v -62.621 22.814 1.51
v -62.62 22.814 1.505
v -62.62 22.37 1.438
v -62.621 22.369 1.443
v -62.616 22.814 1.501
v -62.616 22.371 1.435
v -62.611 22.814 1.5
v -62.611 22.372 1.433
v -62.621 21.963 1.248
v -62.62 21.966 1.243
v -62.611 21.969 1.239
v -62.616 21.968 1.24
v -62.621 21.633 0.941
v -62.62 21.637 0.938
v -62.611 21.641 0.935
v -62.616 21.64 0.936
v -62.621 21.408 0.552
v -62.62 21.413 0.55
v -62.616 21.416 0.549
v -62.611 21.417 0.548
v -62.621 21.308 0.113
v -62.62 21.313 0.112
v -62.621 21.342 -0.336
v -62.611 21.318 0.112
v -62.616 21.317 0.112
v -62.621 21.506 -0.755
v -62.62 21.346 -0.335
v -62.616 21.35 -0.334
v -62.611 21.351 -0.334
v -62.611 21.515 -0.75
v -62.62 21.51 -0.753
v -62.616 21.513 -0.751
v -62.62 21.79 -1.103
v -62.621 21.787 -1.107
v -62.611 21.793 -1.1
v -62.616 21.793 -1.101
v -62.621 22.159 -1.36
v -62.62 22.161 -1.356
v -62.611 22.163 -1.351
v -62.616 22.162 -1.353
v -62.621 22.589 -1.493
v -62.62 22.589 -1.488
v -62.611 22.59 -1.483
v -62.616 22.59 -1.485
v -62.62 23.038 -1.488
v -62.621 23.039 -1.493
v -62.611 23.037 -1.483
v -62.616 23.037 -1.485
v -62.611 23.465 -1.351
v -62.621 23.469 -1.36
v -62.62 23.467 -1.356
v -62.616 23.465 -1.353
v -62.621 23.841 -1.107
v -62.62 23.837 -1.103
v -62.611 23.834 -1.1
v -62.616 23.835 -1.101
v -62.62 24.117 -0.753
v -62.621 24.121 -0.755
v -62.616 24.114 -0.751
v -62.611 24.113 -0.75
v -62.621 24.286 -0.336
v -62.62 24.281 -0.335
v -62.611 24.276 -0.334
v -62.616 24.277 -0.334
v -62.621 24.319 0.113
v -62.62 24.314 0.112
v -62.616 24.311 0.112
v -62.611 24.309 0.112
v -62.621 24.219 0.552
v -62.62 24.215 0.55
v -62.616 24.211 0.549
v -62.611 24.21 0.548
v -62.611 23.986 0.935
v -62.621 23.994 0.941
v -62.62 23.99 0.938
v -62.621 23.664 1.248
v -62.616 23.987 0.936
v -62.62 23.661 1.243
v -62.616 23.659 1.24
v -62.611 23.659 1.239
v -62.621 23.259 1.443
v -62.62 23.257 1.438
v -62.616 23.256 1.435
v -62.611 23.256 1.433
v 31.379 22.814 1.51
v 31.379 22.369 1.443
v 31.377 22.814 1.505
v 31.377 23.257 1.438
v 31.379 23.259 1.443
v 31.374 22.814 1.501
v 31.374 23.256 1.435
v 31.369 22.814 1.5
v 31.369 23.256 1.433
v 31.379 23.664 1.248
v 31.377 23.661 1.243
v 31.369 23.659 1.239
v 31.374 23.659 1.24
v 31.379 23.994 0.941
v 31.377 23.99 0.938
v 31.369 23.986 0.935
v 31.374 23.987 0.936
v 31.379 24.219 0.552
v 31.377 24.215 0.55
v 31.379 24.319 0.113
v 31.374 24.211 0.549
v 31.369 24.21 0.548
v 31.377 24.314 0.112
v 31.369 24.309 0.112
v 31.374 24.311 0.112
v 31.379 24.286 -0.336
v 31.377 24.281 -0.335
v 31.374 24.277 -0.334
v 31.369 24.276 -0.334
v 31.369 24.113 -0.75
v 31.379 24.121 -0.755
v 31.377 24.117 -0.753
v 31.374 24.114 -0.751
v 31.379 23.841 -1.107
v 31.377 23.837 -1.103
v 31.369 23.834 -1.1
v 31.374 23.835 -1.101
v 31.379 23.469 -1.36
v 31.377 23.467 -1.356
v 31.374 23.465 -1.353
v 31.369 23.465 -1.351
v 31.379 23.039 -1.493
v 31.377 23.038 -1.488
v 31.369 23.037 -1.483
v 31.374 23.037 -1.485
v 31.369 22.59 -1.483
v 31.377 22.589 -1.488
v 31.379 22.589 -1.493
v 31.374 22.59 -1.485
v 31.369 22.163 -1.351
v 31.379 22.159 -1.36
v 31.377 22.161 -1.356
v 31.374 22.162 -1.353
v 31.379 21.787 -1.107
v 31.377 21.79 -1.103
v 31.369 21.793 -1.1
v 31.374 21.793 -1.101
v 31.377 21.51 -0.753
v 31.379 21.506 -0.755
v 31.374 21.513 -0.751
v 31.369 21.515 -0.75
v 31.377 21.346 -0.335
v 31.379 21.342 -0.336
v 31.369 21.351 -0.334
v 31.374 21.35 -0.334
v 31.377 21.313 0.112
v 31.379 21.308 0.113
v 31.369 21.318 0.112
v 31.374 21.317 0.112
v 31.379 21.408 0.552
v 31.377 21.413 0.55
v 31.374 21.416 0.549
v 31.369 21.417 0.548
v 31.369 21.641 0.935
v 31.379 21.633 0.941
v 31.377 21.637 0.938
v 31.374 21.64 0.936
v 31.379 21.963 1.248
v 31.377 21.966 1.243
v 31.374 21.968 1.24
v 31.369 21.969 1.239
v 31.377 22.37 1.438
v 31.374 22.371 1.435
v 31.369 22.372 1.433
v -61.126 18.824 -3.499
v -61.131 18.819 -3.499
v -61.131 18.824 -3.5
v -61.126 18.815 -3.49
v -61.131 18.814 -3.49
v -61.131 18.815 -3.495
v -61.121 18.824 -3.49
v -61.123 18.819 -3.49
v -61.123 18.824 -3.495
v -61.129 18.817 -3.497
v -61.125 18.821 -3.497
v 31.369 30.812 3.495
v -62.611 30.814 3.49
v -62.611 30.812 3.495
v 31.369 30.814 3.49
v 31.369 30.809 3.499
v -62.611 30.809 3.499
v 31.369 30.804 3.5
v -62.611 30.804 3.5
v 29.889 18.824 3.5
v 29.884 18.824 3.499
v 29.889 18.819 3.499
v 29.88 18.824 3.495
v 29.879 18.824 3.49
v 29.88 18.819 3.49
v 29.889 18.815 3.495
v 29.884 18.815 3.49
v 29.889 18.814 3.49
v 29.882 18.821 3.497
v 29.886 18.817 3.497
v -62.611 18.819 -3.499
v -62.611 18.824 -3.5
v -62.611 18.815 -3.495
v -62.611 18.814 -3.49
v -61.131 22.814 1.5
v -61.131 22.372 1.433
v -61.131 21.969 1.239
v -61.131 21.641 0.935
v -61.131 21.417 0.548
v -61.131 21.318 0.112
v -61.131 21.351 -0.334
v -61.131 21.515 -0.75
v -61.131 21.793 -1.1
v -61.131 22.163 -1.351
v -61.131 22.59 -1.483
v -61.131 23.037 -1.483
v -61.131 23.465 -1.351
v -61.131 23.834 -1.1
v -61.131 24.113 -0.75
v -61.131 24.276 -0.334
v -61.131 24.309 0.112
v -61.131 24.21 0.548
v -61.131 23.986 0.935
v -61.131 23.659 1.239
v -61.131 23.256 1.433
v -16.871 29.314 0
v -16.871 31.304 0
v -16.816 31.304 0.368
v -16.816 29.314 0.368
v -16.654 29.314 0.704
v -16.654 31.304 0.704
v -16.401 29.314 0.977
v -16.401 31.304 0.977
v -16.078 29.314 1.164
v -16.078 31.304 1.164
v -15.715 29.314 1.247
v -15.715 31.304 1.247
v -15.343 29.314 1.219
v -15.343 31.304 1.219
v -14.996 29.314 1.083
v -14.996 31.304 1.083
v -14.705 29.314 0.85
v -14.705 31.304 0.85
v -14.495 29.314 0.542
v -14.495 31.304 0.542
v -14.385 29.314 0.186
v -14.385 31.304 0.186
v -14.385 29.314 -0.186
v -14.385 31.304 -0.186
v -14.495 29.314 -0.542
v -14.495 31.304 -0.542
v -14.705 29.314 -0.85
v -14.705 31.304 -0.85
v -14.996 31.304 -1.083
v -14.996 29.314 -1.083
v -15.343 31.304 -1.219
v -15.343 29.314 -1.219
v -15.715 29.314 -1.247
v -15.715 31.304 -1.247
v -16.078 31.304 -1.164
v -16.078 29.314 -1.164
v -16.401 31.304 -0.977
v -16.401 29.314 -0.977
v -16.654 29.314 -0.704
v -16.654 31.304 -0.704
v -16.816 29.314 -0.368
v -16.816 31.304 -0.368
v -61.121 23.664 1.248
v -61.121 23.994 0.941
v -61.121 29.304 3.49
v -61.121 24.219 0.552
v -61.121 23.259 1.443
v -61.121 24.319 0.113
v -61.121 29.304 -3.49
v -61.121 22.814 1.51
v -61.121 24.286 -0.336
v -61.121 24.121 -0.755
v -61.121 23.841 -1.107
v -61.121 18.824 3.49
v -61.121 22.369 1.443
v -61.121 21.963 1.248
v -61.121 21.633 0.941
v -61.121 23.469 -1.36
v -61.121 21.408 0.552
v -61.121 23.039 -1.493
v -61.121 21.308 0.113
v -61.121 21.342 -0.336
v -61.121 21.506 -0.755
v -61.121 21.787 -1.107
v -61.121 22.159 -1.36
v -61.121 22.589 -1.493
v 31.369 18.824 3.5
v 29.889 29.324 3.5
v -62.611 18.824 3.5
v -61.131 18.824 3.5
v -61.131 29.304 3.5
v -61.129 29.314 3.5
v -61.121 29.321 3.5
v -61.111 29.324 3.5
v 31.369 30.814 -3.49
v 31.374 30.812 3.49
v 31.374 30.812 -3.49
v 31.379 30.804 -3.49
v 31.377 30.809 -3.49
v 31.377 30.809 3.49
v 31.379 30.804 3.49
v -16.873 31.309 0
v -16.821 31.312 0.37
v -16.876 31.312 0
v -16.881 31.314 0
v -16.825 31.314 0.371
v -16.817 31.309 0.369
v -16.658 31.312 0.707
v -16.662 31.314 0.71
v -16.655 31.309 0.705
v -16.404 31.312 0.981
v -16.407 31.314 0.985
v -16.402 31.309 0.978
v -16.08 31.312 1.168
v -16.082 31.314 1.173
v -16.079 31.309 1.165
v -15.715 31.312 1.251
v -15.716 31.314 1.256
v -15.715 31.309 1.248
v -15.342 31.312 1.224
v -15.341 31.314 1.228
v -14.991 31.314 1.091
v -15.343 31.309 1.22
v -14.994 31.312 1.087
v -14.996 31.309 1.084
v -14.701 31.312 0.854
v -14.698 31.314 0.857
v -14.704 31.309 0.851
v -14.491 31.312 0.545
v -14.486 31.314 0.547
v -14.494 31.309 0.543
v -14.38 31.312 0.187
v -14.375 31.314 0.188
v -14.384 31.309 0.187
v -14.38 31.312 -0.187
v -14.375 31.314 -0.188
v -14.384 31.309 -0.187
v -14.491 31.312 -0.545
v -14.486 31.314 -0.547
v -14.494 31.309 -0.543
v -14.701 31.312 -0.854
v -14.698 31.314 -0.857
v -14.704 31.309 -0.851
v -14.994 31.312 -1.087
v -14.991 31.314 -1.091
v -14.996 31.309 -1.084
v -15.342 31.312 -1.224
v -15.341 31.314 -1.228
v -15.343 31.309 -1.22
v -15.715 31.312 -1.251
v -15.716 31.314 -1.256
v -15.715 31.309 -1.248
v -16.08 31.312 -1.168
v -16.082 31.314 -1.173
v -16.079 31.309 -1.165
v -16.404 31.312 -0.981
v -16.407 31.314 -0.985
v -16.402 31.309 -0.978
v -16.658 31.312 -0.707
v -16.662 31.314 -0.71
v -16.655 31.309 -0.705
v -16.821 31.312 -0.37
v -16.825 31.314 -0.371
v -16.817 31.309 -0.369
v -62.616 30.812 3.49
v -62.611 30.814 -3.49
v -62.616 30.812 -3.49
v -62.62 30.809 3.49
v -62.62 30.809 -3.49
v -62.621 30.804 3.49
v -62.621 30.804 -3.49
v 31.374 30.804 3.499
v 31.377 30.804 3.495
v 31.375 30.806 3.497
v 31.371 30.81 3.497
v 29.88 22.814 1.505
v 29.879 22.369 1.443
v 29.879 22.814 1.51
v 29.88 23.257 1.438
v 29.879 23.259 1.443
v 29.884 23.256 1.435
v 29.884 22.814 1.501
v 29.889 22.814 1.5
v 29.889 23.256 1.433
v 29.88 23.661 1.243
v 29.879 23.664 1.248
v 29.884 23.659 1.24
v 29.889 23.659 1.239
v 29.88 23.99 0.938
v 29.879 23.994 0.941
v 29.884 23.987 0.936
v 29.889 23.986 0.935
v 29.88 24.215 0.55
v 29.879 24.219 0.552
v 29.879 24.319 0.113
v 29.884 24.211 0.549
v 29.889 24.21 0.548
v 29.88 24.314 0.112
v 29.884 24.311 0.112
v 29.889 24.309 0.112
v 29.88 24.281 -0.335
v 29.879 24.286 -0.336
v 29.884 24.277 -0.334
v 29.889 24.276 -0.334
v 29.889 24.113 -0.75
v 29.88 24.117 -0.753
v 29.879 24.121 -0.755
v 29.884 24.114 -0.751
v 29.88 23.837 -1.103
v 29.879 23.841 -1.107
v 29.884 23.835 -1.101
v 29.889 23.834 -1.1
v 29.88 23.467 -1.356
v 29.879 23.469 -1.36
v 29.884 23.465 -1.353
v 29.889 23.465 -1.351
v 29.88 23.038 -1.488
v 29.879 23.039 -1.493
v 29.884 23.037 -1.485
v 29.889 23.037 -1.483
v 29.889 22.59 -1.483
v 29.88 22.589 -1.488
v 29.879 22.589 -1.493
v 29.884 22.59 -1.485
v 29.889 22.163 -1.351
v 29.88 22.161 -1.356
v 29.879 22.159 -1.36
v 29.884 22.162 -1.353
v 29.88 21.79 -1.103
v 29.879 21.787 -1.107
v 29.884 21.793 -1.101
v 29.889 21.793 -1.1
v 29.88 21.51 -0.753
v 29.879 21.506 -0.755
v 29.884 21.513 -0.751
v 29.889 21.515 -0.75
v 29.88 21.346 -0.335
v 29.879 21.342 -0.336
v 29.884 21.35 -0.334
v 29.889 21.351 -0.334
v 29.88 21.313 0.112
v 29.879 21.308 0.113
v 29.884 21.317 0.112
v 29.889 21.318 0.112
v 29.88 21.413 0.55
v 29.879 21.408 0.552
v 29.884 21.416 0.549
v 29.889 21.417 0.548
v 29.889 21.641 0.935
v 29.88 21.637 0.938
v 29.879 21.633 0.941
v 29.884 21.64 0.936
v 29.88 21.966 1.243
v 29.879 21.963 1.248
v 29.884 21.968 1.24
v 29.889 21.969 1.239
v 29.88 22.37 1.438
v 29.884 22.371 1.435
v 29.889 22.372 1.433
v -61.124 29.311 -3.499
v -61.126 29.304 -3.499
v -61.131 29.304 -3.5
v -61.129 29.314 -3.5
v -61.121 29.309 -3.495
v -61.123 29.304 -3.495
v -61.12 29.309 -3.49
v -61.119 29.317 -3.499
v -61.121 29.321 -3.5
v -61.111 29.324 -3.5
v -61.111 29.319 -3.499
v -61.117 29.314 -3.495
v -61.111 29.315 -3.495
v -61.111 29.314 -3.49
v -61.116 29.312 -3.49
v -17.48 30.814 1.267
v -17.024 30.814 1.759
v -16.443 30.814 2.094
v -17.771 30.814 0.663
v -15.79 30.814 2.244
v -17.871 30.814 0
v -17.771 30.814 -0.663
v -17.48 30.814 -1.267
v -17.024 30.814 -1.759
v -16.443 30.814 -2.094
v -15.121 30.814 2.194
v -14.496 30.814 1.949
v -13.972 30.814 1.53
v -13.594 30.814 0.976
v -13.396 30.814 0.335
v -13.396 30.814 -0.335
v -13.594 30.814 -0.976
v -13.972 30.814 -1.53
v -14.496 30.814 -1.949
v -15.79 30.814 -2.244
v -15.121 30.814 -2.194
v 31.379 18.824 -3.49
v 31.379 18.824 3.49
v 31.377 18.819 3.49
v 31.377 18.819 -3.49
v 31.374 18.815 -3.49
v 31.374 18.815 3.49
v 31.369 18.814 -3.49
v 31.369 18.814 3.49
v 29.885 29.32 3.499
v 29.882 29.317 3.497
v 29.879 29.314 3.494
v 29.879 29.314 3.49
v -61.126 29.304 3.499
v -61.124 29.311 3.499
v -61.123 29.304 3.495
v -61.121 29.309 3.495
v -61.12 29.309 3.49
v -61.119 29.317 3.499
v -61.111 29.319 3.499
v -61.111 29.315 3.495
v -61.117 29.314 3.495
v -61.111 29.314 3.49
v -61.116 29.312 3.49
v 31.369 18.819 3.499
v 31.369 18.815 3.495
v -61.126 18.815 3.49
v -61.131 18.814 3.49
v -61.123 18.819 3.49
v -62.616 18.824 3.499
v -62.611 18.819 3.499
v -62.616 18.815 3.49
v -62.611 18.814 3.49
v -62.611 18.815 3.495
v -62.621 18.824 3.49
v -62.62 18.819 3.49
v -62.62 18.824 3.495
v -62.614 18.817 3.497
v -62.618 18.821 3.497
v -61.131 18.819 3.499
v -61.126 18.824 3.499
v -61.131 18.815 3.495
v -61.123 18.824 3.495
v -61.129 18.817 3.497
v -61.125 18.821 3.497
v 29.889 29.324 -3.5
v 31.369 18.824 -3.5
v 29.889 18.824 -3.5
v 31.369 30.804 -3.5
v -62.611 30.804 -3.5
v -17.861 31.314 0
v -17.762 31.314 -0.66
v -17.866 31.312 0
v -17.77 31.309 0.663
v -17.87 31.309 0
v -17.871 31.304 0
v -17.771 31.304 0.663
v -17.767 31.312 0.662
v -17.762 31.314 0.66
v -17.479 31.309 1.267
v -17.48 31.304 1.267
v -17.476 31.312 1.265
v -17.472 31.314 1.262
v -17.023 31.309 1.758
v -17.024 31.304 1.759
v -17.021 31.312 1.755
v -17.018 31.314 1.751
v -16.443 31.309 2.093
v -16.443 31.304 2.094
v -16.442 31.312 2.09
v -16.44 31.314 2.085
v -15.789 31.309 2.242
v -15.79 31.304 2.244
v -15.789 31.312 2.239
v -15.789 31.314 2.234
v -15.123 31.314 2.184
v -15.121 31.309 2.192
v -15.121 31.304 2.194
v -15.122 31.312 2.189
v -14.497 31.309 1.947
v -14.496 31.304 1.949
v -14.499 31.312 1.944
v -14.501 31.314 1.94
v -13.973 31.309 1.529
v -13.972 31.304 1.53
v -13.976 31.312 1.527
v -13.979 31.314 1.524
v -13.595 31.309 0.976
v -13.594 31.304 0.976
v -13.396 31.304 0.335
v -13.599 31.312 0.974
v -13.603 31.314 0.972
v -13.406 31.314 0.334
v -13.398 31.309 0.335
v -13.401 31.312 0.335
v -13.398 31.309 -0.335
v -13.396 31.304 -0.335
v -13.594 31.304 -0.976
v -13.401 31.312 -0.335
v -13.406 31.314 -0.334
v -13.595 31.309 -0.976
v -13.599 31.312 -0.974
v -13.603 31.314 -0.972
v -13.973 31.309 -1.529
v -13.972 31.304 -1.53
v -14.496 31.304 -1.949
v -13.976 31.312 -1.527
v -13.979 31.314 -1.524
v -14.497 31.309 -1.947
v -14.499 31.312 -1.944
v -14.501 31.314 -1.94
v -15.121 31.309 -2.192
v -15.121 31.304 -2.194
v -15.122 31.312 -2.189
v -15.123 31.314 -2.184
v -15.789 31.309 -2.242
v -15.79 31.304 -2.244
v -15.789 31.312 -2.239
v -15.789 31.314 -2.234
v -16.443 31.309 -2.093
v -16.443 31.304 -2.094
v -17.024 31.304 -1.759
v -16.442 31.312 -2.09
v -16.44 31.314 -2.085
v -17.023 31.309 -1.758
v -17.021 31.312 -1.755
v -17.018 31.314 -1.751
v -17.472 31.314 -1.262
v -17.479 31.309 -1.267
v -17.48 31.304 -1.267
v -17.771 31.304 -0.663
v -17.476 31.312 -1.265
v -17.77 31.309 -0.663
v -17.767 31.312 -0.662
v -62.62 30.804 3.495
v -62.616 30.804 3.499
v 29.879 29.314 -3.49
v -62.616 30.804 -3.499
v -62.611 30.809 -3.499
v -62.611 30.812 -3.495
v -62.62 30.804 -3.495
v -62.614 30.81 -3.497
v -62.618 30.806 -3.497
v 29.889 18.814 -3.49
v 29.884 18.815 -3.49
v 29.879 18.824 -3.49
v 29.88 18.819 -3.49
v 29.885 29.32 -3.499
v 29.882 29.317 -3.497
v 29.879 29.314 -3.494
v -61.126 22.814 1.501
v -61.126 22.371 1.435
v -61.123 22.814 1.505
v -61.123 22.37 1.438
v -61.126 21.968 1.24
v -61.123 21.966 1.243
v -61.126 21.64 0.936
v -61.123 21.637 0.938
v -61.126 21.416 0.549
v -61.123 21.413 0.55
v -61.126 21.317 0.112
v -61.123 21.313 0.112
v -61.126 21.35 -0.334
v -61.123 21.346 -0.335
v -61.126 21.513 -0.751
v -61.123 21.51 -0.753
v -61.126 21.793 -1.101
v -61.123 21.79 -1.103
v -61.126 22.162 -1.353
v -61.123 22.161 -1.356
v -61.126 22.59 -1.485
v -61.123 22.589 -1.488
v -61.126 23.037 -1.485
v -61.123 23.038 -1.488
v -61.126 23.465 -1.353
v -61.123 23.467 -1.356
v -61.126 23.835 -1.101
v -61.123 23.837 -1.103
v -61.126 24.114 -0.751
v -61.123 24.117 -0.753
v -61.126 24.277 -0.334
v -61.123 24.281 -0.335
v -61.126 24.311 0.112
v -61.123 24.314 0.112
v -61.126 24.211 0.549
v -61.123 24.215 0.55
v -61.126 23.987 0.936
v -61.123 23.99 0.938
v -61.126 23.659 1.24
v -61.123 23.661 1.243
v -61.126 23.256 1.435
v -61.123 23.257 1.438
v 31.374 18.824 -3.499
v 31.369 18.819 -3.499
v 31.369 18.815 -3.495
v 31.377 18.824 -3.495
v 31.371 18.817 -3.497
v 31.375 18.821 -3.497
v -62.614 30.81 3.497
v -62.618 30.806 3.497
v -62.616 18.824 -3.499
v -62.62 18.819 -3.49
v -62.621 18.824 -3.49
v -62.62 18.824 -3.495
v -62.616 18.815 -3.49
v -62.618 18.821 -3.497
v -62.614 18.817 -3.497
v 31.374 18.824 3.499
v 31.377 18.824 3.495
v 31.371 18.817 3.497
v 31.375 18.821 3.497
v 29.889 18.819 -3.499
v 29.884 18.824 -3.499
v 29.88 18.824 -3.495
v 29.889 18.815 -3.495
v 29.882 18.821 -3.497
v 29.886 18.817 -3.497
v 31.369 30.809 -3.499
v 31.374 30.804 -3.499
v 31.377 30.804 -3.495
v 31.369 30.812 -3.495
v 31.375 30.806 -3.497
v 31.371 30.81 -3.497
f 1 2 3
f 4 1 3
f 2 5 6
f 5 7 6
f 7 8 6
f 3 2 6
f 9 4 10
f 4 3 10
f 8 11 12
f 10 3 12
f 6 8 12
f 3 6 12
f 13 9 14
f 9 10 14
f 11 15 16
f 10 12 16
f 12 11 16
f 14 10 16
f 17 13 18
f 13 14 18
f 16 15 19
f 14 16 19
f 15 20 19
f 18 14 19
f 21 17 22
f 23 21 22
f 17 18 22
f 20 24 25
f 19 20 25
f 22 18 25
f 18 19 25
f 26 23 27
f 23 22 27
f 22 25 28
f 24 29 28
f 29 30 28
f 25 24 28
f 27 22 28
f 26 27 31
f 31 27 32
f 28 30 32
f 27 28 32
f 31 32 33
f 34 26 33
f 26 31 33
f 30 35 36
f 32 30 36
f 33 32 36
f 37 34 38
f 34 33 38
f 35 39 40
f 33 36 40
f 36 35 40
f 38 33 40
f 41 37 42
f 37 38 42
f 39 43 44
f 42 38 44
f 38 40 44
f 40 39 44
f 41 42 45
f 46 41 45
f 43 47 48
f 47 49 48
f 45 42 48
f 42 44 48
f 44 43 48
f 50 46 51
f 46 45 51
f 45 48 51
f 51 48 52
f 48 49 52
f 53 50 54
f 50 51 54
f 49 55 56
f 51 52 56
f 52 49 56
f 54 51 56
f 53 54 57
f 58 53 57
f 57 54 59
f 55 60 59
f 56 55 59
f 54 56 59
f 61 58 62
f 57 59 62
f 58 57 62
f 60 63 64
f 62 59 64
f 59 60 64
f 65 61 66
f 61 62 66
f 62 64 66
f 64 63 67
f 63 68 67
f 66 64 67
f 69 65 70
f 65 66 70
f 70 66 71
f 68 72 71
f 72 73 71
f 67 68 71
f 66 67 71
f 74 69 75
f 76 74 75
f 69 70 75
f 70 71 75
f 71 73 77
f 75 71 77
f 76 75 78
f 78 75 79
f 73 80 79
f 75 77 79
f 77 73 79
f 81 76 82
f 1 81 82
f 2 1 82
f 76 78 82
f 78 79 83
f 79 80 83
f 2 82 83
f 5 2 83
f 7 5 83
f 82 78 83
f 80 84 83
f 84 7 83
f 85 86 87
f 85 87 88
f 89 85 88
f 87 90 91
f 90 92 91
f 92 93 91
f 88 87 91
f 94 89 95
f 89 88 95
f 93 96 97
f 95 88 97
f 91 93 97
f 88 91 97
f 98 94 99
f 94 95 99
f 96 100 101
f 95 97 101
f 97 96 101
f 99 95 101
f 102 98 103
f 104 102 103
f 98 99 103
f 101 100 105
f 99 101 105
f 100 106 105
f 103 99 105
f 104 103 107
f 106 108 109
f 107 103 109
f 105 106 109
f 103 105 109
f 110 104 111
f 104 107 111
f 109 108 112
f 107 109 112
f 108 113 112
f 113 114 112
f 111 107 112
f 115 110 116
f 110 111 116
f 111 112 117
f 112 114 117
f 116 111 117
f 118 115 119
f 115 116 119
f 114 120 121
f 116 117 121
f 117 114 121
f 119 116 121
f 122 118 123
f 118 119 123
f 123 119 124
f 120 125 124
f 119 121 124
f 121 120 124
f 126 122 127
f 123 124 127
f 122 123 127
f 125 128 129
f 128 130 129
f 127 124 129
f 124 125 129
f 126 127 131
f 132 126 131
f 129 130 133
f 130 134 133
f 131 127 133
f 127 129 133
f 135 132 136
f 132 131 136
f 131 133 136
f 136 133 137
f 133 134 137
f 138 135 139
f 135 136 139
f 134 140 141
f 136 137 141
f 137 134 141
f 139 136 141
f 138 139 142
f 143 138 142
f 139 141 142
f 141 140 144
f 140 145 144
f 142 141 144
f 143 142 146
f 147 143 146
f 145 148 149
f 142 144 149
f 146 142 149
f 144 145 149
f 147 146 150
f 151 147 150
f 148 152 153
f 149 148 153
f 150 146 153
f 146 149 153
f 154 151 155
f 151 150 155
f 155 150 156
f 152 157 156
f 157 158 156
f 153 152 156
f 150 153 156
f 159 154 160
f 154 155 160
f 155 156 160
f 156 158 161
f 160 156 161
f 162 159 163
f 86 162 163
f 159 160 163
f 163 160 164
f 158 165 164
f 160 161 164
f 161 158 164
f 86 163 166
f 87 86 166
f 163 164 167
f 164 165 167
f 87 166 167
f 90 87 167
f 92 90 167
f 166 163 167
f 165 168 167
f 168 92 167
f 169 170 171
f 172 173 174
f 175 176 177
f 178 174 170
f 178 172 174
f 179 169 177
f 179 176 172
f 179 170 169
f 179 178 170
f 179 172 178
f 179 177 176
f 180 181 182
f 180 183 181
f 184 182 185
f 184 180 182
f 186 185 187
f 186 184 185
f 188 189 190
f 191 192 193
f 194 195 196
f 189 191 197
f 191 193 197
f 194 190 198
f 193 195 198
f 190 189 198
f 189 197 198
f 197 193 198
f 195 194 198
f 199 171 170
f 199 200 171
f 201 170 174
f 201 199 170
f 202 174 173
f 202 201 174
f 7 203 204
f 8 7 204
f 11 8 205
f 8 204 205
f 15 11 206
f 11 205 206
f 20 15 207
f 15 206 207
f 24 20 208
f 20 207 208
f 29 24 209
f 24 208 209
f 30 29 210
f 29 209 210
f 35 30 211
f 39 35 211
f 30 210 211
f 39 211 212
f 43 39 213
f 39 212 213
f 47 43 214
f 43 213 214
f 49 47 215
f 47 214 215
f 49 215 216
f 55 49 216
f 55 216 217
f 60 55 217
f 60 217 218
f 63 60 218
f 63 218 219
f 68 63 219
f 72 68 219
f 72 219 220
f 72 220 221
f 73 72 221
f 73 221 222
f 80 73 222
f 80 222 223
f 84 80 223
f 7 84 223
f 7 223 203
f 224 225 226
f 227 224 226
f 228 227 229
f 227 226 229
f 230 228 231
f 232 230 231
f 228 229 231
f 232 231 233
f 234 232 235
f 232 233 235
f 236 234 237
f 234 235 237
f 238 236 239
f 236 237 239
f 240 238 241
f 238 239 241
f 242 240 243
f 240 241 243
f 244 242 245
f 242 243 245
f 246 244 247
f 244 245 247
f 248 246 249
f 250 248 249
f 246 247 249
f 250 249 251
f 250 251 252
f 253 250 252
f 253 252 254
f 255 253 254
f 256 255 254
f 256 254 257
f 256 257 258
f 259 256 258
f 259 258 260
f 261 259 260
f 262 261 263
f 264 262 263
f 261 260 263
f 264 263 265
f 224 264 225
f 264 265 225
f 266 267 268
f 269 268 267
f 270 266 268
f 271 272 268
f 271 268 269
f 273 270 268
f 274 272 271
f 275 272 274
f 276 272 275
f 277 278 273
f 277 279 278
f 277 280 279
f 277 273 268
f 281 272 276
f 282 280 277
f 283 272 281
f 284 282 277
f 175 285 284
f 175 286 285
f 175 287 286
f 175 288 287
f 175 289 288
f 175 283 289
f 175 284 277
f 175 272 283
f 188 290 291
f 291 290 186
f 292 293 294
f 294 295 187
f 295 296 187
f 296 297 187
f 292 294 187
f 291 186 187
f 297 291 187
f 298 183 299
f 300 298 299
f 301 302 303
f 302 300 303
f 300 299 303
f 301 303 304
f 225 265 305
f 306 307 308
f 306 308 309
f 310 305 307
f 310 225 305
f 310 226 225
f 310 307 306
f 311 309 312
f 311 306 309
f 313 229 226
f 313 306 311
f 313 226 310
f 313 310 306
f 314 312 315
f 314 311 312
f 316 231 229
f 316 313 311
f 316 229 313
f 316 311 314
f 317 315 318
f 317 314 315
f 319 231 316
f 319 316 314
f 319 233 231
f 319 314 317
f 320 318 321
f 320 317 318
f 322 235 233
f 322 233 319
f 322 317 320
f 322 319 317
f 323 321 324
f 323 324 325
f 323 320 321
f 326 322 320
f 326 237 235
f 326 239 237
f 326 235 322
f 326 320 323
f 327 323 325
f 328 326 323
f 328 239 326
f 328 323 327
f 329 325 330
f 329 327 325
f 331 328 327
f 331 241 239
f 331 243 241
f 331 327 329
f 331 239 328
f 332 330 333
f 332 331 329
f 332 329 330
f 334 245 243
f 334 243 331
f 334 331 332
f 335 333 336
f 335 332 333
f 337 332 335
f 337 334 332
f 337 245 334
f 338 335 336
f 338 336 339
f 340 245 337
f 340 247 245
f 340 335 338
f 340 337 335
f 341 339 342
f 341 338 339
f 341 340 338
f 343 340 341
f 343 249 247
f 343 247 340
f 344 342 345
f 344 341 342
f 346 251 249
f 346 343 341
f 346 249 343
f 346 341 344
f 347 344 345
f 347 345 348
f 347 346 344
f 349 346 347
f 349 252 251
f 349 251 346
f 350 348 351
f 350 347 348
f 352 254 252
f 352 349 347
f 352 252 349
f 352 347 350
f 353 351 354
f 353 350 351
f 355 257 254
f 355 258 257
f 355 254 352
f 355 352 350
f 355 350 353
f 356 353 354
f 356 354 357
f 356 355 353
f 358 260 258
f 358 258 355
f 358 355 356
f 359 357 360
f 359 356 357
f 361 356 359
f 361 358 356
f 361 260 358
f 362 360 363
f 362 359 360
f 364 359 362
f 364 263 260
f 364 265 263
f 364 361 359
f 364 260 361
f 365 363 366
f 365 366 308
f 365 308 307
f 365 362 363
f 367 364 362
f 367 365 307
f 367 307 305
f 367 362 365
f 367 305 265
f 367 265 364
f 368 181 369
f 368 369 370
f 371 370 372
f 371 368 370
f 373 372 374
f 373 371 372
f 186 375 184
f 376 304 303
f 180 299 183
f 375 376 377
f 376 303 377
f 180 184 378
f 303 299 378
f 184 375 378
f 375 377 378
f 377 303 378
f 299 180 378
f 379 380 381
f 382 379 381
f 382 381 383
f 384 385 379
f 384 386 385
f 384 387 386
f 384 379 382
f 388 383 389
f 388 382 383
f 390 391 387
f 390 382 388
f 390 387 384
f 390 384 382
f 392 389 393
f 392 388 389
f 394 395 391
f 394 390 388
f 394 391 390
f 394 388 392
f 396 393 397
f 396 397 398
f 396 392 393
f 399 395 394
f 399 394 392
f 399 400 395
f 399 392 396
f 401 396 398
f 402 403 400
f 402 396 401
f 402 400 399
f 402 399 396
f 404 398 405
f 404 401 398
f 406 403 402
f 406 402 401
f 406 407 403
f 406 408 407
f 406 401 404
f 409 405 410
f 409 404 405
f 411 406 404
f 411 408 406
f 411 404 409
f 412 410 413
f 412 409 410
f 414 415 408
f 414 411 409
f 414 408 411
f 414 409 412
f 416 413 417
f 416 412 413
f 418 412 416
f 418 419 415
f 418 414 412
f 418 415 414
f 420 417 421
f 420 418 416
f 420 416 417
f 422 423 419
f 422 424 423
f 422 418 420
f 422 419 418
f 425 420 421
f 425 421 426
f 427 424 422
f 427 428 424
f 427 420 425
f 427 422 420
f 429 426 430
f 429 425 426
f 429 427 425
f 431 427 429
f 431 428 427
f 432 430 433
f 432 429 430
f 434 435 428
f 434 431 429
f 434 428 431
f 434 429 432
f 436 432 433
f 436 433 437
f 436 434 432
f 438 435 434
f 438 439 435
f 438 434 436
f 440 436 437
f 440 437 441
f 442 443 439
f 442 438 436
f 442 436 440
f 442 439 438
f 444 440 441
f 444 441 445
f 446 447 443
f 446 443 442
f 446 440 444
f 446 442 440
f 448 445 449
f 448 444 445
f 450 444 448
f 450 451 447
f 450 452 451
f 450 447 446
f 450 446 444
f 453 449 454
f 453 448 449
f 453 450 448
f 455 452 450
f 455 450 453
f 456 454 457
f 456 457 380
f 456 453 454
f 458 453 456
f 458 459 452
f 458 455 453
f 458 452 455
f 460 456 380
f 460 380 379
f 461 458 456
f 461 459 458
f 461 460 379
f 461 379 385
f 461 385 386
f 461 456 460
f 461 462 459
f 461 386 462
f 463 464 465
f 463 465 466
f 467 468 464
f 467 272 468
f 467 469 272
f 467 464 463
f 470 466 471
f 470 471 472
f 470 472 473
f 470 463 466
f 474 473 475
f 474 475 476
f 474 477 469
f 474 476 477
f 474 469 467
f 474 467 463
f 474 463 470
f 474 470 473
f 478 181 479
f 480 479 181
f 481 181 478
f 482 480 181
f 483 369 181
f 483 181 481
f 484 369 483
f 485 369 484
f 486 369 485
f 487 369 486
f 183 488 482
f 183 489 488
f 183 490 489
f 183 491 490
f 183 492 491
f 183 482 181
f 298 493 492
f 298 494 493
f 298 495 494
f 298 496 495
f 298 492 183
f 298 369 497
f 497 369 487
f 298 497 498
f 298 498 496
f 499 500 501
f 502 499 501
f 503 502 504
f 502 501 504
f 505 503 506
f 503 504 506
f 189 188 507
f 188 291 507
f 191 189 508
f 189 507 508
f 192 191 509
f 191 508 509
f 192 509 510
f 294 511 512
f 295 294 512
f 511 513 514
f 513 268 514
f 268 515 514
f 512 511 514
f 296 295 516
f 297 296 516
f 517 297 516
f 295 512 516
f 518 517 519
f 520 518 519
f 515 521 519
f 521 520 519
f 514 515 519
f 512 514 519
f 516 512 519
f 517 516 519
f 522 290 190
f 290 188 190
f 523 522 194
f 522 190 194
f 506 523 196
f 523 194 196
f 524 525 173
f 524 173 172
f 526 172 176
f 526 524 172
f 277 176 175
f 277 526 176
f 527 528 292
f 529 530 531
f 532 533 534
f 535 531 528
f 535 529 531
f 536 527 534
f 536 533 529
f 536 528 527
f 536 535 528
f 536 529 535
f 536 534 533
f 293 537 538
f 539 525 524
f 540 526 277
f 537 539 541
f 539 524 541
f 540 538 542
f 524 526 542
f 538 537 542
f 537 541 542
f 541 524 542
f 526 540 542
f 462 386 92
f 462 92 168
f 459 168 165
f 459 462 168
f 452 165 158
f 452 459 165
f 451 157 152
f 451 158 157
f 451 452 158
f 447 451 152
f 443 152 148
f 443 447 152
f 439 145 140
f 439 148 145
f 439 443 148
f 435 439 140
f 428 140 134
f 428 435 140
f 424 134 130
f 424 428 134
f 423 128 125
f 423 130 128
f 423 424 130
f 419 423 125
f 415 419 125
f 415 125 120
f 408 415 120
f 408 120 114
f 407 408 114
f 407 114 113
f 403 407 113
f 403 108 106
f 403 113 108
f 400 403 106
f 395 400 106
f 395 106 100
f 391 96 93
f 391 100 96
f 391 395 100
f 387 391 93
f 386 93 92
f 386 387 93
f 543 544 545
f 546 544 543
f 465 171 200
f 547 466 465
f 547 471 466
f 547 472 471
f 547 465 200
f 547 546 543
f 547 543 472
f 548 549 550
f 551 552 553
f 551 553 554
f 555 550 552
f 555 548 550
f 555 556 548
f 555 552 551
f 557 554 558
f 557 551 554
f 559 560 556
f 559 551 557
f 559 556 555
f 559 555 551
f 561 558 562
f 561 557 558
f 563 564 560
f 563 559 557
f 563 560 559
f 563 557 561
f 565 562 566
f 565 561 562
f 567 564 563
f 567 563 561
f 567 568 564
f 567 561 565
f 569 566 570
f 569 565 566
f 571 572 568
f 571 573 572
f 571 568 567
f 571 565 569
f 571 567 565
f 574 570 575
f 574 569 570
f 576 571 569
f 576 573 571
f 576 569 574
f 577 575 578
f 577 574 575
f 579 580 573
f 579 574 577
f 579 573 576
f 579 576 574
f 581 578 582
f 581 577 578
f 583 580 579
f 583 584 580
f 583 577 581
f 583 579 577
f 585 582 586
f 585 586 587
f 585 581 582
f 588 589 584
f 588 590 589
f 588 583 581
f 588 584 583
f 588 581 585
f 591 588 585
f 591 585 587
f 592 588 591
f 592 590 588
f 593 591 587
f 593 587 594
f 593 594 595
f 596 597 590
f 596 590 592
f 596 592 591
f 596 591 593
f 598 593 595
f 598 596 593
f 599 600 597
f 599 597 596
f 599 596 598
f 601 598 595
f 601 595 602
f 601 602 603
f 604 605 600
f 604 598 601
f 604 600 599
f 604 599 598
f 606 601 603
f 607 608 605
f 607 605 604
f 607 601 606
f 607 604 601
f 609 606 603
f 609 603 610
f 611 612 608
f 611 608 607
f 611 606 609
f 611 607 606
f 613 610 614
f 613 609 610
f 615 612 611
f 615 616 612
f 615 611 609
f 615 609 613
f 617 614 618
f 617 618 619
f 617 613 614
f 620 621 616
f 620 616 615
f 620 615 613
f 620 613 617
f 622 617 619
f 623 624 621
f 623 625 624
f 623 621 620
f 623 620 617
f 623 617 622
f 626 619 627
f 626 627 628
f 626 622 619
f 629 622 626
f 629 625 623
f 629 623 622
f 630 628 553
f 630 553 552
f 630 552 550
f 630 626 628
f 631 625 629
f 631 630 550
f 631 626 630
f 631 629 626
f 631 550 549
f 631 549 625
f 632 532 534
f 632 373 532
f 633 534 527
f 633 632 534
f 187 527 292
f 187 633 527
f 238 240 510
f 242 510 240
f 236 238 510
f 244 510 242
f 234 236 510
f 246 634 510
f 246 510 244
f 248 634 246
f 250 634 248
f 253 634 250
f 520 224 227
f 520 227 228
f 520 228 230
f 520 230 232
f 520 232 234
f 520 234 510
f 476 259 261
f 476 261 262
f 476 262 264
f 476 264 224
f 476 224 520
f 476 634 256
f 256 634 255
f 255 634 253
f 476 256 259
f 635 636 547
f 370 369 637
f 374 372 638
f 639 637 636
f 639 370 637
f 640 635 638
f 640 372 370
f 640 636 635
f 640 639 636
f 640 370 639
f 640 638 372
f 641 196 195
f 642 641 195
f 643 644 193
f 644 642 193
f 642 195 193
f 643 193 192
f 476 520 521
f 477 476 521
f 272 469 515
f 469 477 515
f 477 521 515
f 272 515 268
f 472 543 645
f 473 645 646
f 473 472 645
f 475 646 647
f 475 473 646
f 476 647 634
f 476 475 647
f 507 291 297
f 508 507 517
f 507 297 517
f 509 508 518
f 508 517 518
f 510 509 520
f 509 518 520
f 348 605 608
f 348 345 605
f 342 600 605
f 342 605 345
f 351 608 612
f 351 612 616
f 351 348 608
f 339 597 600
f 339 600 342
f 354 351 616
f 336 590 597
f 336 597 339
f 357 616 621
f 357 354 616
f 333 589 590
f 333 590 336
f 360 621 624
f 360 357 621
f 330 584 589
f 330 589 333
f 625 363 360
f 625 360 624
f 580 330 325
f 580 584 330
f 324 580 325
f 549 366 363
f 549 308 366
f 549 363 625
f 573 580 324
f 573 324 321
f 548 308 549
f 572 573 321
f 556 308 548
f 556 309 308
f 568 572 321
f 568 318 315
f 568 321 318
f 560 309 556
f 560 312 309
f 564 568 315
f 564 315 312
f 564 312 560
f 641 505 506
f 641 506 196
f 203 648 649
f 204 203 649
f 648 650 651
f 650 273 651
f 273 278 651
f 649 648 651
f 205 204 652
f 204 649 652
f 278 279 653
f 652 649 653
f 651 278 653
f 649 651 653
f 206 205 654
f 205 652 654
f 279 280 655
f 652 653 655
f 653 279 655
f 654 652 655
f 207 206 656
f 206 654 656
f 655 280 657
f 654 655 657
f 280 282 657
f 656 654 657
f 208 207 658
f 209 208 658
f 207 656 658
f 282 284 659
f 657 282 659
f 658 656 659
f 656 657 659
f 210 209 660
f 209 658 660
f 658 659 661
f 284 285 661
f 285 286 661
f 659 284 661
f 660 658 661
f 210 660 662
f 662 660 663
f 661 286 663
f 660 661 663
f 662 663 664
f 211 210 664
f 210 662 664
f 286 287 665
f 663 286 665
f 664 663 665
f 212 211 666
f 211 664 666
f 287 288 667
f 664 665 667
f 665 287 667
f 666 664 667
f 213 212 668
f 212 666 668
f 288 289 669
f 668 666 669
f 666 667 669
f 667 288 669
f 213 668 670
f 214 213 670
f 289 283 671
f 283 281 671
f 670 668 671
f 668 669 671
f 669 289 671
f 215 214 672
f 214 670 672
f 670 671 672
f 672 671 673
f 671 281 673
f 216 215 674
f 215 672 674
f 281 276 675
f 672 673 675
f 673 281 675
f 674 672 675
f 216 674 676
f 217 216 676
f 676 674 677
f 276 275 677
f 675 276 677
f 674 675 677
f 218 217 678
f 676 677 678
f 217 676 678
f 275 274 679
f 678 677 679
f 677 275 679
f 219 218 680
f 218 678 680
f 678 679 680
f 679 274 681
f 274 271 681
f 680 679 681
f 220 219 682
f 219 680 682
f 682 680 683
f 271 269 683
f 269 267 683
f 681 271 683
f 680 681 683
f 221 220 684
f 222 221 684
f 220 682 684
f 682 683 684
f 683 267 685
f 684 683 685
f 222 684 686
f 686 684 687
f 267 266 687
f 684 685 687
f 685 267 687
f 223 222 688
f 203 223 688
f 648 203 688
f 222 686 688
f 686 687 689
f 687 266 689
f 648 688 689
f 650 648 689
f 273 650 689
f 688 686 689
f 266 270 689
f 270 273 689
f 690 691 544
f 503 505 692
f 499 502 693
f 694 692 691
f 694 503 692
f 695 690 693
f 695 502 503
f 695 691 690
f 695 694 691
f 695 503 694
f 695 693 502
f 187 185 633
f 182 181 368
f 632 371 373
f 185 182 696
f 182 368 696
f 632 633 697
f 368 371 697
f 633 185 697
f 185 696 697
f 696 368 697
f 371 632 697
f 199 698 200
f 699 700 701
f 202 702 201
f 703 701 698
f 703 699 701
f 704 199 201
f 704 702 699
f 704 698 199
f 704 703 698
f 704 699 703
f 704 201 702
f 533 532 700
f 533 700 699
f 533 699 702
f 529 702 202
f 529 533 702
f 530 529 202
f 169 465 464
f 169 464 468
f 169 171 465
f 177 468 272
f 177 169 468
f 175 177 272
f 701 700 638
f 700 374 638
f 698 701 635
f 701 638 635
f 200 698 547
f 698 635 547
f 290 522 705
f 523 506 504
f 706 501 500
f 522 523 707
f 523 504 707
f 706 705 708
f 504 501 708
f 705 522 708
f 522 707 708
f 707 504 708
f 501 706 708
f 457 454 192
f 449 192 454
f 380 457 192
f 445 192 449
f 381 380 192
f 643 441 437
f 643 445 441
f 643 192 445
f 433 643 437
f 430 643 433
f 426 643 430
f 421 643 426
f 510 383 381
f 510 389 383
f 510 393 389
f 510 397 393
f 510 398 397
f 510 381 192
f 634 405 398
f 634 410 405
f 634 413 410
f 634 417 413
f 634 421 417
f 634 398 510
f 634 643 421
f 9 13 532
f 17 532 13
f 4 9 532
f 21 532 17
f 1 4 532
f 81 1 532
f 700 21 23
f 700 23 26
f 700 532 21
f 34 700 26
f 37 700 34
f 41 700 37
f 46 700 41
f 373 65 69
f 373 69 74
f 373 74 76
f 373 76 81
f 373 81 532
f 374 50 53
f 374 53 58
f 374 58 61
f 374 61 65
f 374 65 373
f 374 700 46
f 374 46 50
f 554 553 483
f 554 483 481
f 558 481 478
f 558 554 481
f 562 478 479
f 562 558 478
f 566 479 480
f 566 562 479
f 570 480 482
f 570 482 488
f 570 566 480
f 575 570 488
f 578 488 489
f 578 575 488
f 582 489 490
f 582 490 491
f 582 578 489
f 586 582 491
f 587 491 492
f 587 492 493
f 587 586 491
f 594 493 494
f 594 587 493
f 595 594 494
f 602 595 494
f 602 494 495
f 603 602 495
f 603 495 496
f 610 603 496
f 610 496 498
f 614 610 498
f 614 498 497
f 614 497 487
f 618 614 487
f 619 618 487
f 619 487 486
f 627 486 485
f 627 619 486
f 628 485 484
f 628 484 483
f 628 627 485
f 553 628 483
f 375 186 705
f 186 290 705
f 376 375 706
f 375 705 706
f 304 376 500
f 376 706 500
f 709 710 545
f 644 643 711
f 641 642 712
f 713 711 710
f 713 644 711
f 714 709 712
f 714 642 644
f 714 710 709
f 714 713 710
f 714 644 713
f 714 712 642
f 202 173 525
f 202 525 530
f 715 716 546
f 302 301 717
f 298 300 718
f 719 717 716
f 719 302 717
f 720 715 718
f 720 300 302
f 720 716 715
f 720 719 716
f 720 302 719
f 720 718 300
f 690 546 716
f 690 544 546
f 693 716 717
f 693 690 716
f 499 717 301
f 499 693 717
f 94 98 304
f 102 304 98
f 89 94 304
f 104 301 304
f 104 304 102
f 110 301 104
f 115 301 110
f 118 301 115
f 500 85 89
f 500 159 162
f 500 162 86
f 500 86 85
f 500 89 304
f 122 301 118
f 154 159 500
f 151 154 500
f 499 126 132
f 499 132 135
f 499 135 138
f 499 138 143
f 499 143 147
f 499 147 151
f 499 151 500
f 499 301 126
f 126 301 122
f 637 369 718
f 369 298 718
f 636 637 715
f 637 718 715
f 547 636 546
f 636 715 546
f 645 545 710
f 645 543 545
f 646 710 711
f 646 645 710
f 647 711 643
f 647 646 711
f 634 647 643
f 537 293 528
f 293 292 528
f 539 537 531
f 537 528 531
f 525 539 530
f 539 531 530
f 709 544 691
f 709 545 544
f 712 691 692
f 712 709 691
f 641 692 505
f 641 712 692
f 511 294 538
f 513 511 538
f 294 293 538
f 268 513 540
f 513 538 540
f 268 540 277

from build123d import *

# Parameters (mm, degrees)
BOSS_EXTRUDE1_DEPTH            = 3.5
BOSS_EXTRUDE1_DEPTH_BACK       = 3.5
SKETCH3_R                      = 1.25
CUT_EXTRUDE5_DEPTH             = 3.5
BOSS_EXTRUDE2_START            = 0.5
SKETCH5_R                      = 2.25
SKETCH5_R_2                    = 1.25
BOSS_EXTRUDE2_DEPTH            = 0.5
CUT_EXTRUDE6_REACH             = 72.102
SKETCH6_R                      = 1.5
CUT_EXTRUDE6_DIRECTION_2_REACH = 72.102
FILLET1_R                      = 0.01


with BuildPart() as part:
    # Sketch1 → Boss-Extrude1 (new, two sides: drawn at the far end of the back side and taken through both)
    with BuildSketch(Plane.XY.offset(-BOSS_EXTRUDE1_DEPTH_BACK)):
        Polygon((-62.621366216, 18.813688138), (-62.621366216, 30.813688138), (31.378633784, 30.813688138), (31.378633784, 18.813688138), (29.878633784, 18.813688138), (29.878633784, 29.313688138), (-61.121366216, 29.313688138), (-61.121366216, 18.813688138), align=None)
    extrude(amount=BOSS_EXTRUDE1_DEPTH + BOSS_EXTRUDE1_DEPTH_BACK)

    # Sketch3 → Cut-Extrude5 (cut)
    with BuildSketch(Plane(origin=(0, 30.813688138, 0), x_dir=(1, 0, 0), z_dir=(0, 1, 0))):
        with Locations((-15.621366216, 0)):
            Circle(SKETCH3_R)
    extrude(amount=-CUT_EXTRUDE5_DEPTH, mode=Mode.SUBTRACT)

    # Sketch5 → Boss-Extrude2 (add)
    with BuildSketch(Plane(origin=(0, 30.813688138, 0), x_dir=(1, 0, 0), z_dir=(0, 1, 0)).offset(BOSS_EXTRUDE2_START)):
        with Locations((-15.621366216, 0)):
            Circle(SKETCH5_R)
        with Locations((-15.621366216, 0)):
            Circle(SKETCH5_R_2, mode=Mode.SUBTRACT)
    extrude(amount=-BOSS_EXTRUDE2_DEPTH)

    # Cut-Extrude6: up to this face of the body (flat: up to its plane)
    cut_extrude6_end = Plane(part.part.faces().sort_by_distance((31.378633784, 24.813688138, 0))[0])
    # Sketch6 → Cut-Extrude6 (cut, up to the picked face)
    with BuildSketch(Plane(origin=(0, 0, 0), x_dir=(0, 0, -1), z_dir=(1, 0, 0)), mode=Mode.PRIVATE) as cut_extrude6_sk1:
        with Locations((0, 22.813688138)):
            Circle(SKETCH6_R)
    cut_extrude6_tool1 = split(extrude(cut_extrude6_sk1.sketch, amount=CUT_EXTRUDE6_REACH, mode=Mode.PRIVATE), bisect_by=cut_extrude6_end, keep=Keep.BOTH, mode=Mode.PRIVATE)
    add(cut_extrude6_tool1.solids().sort_by(Axis((0, 22.813688, 0), (1, 0, 0)))[0], mode=Mode.SUBTRACT)

    # Cut-Extrude6 direction 2: up to this face of the body (flat: up to its plane)
    cut_extrude6_direction_2_end = Plane(part.part.faces().sort_by_distance((-62.621366216, 24.813688138, 0))[0])
    # Sketch6 → Cut-Extrude6 direction 2 (cut, up to the picked face)
    with BuildSketch(Plane(origin=(0, 0, 0), x_dir=(0, 0, -1), z_dir=(1, 0, 0)), mode=Mode.PRIVATE) as cut_extrude6_direction_2_sk1:
        with Locations((0, 22.813688138)):
            Circle(SKETCH6_R)
    cut_extrude6_direction_2_tool1 = split(extrude(cut_extrude6_direction_2_sk1.sketch, amount=-CUT_EXTRUDE6_DIRECTION_2_REACH, mode=Mode.PRIVATE), bisect_by=cut_extrude6_direction_2_end, keep=Keep.BOTH, mode=Mode.PRIVATE)
    add(cut_extrude6_direction_2_tool1.solids().sort_by(Axis((0, 22.813688, 0), (-1, 0, 0)))[0], mode=Mode.SUBTRACT)

    # Fillet1
    fillet1_edges = [part.edges().sort_by_distance(p)[0] for p in [
        (-15.621366216, 29.313688138, -3.5),
        (31.378633784, 22.813688138, 1.5),
        (31.378633784, 24.813688138, -3.5),
        (31.378633784, 18.813688138, 0),
        (31.378633784, 24.813688138, 3.5),
        (31.378633784, 30.813688138, 0),
        (-61.121366216, 24.063688138, -3.5),
        (-61.121366216, 18.813688138, 0),
        (-61.121366216, 24.063688138, 3.5),
        (-61.121366216, 29.313688138, 0),
        (-62.621366216, 24.813688138, -3.5),
        (-62.621366216, 30.813688138, 0),
        (-62.621366216, 24.813688138, 3.5),
        (-62.621366216, 18.813688138, 0),
        (-16.871366216, 31.313688138, 0),
        (-17.871366216, 31.313688138, 0),
        (29.878633784, 24.063688138, -3.5),
        (29.878633784, 18.813688138, 0),
        (29.878633784, 22.813688138, 1.5),
        (29.878633784, 24.063688138, 3.5),
        (-61.871366216, 18.813688138, 3.5),
        (-15.621366216, 29.313688138, 3.5),
        (-15.621366216, 30.813688138, -3.5),
        (-15.621366216, 30.813688138, 3.5),
        (-61.121366216, 22.813688138, 1.5),
        (-61.871366216, 18.813688138, -3.5),
        (-62.621366216, 22.813688138, 1.5),
        (30.628633784, 18.813688138, -3.5),
        (30.628633784, 18.813688138, 3.5),
    ]]
    fillet(fillet1_edges, radius=FILLET1_R)


solid = part.part
